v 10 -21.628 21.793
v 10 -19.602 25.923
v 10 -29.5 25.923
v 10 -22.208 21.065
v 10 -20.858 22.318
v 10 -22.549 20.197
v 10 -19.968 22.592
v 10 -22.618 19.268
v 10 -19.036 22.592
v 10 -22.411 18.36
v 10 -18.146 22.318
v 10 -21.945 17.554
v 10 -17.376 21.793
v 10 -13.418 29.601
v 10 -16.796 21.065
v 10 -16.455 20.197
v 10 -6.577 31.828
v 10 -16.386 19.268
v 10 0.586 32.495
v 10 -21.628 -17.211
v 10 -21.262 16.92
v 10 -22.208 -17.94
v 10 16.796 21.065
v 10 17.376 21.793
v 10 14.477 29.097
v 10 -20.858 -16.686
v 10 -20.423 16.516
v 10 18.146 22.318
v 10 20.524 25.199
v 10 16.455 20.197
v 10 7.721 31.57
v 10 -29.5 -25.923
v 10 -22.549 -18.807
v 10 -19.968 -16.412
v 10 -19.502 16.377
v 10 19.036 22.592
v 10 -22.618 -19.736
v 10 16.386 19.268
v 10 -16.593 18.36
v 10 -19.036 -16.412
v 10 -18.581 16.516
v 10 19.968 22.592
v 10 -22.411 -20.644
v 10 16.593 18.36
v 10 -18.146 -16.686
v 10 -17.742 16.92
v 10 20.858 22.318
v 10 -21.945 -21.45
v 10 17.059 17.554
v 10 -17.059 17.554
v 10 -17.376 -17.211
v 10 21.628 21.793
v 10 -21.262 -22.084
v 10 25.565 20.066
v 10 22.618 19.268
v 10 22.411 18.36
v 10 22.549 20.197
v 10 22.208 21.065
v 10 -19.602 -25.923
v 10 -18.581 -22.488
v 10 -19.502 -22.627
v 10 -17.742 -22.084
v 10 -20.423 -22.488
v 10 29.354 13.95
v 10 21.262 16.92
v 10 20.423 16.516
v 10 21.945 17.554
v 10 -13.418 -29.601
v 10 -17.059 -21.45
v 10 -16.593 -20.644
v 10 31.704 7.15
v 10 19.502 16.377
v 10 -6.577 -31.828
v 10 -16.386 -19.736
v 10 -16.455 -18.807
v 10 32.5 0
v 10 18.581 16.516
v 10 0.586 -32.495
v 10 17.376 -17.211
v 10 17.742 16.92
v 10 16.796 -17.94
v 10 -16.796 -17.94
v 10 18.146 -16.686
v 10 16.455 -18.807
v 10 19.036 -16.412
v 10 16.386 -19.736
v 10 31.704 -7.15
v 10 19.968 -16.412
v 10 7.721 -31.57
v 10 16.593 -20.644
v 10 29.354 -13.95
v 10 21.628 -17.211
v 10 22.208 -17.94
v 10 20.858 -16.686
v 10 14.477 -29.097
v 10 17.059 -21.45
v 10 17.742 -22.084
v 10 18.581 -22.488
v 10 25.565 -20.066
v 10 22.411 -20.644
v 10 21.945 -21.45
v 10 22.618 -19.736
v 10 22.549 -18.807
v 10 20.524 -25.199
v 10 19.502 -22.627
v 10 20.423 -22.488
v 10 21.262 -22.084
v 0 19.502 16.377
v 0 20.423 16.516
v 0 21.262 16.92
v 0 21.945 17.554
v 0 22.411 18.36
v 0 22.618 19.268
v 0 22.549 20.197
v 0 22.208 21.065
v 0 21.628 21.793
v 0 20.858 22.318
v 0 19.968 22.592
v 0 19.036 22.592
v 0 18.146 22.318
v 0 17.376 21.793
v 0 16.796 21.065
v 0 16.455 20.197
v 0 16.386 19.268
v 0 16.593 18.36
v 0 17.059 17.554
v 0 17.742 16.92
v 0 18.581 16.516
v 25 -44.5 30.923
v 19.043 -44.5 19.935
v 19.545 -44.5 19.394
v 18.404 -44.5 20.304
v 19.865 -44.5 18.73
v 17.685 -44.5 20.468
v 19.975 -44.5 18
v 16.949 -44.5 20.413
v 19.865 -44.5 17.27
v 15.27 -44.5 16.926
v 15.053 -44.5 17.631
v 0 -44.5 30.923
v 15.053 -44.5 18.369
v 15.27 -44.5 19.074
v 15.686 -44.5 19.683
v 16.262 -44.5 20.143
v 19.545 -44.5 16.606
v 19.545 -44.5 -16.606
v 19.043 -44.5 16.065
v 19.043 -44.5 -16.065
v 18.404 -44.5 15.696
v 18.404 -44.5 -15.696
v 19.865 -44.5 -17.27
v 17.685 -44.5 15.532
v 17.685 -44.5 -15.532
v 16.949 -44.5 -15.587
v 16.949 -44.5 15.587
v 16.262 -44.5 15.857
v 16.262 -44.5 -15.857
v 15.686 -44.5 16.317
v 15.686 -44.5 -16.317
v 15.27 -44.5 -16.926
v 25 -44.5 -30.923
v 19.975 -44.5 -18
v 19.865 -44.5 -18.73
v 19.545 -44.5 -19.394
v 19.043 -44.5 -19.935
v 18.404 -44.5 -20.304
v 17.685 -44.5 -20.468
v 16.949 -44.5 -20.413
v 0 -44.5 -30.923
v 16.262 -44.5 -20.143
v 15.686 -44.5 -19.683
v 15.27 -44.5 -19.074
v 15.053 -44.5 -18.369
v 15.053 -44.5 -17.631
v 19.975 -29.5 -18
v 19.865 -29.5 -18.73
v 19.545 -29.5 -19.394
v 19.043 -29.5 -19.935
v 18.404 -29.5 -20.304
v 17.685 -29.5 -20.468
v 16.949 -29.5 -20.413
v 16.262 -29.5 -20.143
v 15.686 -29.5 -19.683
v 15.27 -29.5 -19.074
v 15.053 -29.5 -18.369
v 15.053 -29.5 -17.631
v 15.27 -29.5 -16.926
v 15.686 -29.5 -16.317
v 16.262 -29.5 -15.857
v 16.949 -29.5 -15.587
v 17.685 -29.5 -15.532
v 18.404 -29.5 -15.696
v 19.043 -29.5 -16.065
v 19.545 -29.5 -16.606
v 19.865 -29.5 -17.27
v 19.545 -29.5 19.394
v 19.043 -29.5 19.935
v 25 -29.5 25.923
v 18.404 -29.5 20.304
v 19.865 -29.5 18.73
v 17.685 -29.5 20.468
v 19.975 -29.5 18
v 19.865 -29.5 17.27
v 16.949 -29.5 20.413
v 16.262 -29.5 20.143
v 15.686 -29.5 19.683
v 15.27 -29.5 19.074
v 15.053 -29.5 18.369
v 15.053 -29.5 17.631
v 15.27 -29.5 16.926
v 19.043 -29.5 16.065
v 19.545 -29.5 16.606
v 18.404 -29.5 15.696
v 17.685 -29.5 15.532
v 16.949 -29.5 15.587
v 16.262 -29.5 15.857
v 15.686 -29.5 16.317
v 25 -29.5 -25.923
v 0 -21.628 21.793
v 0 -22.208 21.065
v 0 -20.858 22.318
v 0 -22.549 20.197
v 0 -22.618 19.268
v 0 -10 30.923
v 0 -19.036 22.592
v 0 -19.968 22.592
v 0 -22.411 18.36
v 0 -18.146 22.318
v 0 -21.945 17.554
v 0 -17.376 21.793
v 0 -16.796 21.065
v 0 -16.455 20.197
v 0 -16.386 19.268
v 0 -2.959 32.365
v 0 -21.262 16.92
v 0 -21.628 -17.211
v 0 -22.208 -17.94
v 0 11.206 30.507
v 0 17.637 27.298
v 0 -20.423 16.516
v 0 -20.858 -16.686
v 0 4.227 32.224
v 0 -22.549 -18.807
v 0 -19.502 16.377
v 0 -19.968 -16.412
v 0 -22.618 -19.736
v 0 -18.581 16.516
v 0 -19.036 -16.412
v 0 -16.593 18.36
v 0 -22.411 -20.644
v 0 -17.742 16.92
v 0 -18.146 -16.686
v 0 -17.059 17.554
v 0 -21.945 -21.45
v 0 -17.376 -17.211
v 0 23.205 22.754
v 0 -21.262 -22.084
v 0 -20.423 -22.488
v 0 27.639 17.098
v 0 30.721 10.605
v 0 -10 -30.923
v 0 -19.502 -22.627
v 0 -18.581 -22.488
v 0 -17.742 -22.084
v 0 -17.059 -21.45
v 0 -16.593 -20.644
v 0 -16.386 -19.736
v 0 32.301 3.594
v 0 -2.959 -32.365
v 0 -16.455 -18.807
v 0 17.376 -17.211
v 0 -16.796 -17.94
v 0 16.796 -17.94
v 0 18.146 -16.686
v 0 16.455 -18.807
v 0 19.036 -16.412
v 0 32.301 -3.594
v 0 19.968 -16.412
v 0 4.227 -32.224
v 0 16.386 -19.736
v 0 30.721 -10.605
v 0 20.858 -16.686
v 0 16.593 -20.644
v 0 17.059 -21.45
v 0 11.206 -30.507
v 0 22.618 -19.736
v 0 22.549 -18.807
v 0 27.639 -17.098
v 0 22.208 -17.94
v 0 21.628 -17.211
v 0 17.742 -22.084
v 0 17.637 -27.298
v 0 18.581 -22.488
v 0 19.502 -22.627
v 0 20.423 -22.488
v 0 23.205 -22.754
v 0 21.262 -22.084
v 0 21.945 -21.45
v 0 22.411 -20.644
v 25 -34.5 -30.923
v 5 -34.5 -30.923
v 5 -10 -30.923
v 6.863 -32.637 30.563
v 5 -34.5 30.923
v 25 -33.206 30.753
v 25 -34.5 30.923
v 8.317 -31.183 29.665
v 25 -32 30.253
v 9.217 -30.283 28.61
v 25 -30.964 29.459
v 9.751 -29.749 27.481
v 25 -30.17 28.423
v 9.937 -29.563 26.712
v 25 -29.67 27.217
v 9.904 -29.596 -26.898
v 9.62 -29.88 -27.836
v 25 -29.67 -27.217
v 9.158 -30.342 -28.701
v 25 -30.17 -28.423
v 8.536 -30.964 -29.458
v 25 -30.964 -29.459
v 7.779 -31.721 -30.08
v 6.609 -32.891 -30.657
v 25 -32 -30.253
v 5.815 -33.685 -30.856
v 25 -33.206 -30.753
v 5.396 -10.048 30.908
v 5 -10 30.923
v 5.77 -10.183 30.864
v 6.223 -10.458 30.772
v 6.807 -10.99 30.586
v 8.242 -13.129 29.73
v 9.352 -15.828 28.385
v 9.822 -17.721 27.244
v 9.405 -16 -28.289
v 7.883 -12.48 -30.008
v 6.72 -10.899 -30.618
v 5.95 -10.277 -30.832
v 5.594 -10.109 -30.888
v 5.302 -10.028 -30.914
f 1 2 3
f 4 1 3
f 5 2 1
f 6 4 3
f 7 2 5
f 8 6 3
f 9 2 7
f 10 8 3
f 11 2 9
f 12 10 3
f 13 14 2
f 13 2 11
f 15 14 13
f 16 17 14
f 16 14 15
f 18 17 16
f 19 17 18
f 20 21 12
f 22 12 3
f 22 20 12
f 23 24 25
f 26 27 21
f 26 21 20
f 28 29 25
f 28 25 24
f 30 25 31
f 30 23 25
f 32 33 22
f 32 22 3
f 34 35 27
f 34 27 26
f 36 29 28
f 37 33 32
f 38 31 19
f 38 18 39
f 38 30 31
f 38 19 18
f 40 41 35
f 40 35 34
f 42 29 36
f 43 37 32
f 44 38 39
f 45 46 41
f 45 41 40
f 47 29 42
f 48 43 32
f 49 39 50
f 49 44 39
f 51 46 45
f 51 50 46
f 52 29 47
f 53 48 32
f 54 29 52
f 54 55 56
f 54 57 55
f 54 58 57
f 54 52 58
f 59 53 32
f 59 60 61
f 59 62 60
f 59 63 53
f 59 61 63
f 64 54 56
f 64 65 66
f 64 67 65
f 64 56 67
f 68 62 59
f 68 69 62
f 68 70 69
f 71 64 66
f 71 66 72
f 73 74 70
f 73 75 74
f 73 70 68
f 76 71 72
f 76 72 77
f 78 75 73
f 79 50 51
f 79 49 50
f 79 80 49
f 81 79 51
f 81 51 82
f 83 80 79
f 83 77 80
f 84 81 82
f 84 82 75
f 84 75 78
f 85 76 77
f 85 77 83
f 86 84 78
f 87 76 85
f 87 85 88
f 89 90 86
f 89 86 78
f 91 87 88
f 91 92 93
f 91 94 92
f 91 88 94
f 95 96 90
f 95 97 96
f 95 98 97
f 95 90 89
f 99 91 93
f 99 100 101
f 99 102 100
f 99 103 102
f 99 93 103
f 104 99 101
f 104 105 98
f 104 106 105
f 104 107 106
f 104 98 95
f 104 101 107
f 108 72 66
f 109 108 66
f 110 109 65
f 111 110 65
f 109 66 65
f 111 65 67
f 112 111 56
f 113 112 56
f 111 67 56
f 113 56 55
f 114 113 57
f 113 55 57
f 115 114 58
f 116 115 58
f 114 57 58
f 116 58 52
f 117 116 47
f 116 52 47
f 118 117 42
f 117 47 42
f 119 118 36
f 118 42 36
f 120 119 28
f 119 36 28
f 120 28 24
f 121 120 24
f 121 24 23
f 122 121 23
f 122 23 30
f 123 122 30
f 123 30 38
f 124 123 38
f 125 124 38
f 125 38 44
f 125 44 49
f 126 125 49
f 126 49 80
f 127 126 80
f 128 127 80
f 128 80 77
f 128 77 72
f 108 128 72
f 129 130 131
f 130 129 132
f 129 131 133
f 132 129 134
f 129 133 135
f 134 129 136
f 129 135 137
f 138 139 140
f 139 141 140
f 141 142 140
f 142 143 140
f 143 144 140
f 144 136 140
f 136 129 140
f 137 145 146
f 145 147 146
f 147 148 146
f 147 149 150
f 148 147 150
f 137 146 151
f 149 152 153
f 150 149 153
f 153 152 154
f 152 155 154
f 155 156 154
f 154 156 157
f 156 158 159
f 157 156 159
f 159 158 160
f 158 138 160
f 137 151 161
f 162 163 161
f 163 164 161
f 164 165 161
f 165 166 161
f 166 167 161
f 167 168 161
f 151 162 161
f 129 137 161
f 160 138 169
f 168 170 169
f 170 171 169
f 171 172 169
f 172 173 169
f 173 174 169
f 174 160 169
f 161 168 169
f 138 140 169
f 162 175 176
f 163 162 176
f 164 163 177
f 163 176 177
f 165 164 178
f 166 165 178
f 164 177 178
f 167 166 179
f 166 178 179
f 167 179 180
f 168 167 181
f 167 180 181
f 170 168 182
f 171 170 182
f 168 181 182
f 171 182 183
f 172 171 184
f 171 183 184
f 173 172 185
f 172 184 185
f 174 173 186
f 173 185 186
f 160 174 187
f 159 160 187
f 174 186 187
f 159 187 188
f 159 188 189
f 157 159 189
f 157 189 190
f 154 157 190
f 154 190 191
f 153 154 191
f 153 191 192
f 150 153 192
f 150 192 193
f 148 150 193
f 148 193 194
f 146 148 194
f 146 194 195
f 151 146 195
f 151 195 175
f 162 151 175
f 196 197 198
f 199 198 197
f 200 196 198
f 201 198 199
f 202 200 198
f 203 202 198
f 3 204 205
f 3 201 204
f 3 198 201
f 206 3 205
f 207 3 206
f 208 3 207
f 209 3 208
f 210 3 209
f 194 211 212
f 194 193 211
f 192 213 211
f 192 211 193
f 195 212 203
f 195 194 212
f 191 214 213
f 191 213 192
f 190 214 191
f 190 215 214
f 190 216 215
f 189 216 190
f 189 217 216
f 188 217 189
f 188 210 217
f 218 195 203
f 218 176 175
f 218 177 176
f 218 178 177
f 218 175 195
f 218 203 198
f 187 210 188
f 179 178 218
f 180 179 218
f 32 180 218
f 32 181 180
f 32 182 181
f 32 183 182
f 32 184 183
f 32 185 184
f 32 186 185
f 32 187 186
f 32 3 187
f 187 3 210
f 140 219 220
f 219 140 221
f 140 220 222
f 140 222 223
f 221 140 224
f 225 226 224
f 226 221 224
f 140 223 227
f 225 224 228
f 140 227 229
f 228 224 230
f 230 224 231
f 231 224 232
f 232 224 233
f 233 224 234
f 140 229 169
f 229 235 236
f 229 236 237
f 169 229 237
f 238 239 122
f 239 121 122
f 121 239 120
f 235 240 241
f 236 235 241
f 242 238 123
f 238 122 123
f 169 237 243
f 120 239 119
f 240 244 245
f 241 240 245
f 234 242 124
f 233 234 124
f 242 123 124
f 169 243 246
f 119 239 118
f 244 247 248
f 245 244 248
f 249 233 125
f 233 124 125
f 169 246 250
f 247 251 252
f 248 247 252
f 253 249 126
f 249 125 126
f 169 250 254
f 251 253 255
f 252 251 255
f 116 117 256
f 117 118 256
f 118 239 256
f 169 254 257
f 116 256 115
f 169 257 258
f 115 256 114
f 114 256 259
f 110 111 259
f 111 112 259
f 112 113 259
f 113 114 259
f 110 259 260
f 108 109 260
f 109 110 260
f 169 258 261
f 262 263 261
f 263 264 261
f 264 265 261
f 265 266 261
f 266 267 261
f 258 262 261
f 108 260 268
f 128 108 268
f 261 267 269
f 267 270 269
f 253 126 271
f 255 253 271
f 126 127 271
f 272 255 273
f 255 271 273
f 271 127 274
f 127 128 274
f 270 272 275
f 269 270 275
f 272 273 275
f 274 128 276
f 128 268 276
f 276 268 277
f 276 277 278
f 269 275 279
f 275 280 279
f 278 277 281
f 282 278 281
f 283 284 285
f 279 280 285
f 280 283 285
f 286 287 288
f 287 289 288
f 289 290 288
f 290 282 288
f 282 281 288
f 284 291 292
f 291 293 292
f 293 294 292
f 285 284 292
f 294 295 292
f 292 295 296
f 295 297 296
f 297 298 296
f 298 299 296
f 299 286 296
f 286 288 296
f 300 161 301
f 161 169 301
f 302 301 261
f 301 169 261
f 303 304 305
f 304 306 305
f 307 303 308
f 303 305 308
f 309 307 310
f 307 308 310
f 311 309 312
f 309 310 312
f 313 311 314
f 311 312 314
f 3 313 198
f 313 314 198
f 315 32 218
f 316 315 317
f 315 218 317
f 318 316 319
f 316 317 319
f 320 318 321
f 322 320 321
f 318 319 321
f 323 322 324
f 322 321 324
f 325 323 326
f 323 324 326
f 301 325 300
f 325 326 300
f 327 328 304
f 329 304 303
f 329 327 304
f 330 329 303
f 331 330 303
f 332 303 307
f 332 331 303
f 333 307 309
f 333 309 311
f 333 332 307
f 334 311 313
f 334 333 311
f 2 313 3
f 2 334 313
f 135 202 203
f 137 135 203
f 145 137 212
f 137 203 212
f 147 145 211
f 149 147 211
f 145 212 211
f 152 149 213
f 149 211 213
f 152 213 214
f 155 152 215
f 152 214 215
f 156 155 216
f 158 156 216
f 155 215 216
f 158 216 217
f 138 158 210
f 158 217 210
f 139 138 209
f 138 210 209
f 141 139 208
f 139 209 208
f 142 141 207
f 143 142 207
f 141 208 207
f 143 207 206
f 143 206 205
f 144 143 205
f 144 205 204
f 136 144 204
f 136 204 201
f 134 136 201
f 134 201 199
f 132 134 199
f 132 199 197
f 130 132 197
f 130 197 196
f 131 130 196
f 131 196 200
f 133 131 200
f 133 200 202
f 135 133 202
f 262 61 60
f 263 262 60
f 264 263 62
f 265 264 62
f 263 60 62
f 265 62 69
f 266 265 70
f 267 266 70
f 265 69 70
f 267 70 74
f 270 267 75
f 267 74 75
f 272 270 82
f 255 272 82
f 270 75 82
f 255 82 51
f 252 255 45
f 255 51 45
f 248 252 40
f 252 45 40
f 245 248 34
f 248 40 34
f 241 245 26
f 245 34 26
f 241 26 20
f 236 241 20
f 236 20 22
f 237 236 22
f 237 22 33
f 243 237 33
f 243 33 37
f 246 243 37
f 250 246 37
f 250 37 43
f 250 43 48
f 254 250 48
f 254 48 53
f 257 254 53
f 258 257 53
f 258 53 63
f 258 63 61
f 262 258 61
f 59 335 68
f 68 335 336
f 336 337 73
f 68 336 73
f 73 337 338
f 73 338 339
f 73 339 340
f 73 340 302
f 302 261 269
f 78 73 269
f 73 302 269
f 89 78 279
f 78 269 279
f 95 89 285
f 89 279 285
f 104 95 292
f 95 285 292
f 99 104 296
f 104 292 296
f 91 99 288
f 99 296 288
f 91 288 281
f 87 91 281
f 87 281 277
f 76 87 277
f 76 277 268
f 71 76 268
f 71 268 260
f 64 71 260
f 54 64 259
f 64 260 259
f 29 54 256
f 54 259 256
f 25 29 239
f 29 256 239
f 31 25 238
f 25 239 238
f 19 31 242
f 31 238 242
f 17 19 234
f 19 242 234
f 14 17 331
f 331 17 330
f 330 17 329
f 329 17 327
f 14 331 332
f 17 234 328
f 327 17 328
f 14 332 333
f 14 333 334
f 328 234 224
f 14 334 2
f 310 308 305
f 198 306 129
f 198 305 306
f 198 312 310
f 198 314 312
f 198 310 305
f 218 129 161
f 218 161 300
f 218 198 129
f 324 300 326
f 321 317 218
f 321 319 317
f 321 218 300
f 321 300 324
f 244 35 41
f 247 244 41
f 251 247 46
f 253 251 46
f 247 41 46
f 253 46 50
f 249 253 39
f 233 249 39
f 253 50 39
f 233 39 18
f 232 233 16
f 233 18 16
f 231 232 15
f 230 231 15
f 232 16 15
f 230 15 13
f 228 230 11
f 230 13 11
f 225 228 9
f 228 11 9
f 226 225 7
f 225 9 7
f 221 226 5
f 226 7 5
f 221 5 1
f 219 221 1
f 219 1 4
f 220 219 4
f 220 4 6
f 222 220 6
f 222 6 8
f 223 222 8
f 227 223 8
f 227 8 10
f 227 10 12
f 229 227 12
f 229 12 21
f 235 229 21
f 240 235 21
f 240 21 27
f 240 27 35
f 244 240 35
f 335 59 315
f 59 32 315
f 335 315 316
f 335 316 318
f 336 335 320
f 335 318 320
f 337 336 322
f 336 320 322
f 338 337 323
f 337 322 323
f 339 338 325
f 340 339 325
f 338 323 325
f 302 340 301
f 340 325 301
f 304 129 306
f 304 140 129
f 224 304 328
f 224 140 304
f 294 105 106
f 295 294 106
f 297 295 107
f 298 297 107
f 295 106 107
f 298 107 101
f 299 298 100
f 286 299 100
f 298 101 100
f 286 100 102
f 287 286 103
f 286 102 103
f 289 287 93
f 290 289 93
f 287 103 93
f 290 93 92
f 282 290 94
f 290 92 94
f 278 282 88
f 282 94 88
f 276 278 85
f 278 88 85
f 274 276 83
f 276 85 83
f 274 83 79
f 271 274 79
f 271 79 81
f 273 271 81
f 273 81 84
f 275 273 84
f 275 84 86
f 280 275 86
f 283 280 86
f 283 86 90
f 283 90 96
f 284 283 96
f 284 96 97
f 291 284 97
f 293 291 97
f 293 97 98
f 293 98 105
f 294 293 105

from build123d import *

# Parameters (mm, degrees)
SKETCH1_R           = 32.5
BOSS_EXTRUDE1_DEPTH = 10
SKETCH2_R           = 3.125
CUT_EXTRUDE1_DEPTH  = 11
BOSS_EXTRUDE2_DEPTH = 10
SKETCH4_W           = 61.846584384
SKETCH4_H           = 15
BOSS_EXTRUDE3_DEPTH = 15
SKETCH5_R           = 2.475
CUT_EXTRUDE2_DEPTH  = 16
FILLET1_R           = 5


with BuildPart() as part:
    # Sketch1 → Boss-Extrude1 (new body)
    with BuildSketch(Plane(origin=(0, 0, 0), x_dir=(0, 0, -1), z_dir=(1, 0, 0))):
        Circle(SKETCH1_R)
    extrude(amount=BOSS_EXTRUDE1_DEPTH)

    # Sketch2 → Cut-Extrude1 (cut, through all)
    with BuildSketch(Plane(origin=(10, 0, 0), x_dir=(0, 0, -1), z_dir=(1, 0, 0))):
        with Locations((-19.502005025, -19.502005025)):
            Circle(SKETCH2_R)
        with Locations((-19.502005025, 19.502005025)):
            Circle(SKETCH2_R)
        with Locations((19.502005025, 19.502005025)):
            Circle(SKETCH2_R)
        with Locations((19.502005025, -19.502005025)):
            Circle(SKETCH2_R)
    extrude(amount=-CUT_EXTRUDE1_DEPTH, mode=Mode.SUBTRACT)



with BuildPart() as body_2:
    # Sketch3 → Boss-Extrude2 (new body)
    with BuildSketch(Plane.ZY):
        with BuildLine():
            Line((-30.923292192, -10), (-30.923292192, -44.5))
            Line((-30.923292192, -44.5), (30.923292192, -44.5))
            Line((30.923292192, -44.5), (30.923292192, -10))
            ThreePointArc((30.923292192, -10), (0, -32.5), (-30.923292192, -10))
        make_face()
    extrude(amount=-BOSS_EXTRUDE2_DEPTH)


with BuildPart() as part_1:
    add(part.part)

    add(body_2.part)  # Boss-Extrude3 merges body 2
    # Sketch4 → Boss-Extrude3 (add)
    with BuildSketch(Plane(origin=(10, 0, 0), x_dir=(0, 0, -1), z_dir=(1, 0, 0))):
        with Locations((0, -37)):
            Rectangle(SKETCH4_W, SKETCH4_H)
    extrude(amount=BOSS_EXTRUDE3_DEPTH)

    # Sketch5 → Cut-Extrude2 (cut, through all)
    with BuildSketch(Plane(origin=(0, -29.5, 0), x_dir=(1, 0, 0), z_dir=(0, 1, 0))):
        with Locations((17.5, -18)):
            Circle(SKETCH5_R)
        with Locations((17.5, 18)):
            Circle(SKETCH5_R)
    extrude(amount=-CUT_EXTRUDE2_DEPTH, mode=Mode.SUBTRACT)

    # Fillet1
    fillet1_edges = [part_1.edges().sort_by_distance(p)[0] for p in [
        (17.5, -29.5, 30.923292192),
        (17.5, -29.5, -30.923292192),
        (10, -19.75, -30.923292192),
        (10, -19.75, 30.923292192),
    ]]
    fillet(fillet1_edges, radius=FILLET1_R)


solid = part_1.part
